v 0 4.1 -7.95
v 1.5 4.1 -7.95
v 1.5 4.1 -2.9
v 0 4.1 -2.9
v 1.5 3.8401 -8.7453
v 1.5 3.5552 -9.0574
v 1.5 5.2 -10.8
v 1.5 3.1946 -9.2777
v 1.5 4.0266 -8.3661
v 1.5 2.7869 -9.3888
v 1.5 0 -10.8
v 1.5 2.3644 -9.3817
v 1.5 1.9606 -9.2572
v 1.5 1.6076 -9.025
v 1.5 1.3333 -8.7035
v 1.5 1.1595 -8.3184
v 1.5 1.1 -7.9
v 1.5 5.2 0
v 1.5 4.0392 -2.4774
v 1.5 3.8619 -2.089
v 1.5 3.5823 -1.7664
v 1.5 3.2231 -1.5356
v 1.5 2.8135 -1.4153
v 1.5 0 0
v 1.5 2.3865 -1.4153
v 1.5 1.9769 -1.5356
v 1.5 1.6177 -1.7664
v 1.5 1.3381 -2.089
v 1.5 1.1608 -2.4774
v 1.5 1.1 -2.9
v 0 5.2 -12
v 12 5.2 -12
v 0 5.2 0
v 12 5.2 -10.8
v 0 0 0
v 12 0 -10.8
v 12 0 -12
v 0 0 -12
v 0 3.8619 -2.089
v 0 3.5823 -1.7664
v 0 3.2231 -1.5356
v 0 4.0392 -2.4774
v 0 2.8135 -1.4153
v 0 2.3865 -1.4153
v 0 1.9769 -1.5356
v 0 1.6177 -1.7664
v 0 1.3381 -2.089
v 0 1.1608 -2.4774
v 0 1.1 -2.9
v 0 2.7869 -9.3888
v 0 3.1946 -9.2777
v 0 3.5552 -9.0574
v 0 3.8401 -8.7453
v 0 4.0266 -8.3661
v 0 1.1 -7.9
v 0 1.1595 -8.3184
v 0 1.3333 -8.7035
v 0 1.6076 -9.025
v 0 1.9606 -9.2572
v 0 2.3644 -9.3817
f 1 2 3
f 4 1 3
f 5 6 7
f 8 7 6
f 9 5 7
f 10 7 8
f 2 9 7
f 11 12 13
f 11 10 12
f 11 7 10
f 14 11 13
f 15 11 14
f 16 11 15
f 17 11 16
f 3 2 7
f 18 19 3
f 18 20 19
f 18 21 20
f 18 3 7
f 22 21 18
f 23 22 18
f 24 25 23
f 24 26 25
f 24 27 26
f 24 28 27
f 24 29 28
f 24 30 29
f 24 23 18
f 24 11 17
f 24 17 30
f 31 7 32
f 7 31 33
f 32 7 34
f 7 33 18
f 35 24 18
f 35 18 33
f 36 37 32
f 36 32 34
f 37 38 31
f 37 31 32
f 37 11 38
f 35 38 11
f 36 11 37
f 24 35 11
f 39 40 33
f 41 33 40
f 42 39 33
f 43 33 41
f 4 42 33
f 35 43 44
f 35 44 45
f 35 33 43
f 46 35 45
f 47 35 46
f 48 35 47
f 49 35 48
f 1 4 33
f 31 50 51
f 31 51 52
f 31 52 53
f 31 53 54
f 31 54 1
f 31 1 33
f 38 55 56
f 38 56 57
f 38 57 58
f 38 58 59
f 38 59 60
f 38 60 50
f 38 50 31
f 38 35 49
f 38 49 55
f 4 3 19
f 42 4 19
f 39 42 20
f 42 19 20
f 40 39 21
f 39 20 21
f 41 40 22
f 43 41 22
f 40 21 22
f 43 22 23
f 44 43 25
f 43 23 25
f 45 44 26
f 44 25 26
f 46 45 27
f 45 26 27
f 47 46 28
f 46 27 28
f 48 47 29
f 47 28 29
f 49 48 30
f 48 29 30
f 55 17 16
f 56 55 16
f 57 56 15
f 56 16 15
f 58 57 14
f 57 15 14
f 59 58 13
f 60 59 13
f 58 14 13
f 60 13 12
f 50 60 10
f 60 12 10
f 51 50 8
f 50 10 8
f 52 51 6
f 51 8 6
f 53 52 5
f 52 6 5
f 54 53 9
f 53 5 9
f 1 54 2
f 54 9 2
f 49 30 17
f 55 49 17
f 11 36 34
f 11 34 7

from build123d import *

# Parameters (mm, degrees)
F1_DEPTH = 5.2
F3_DEPTH = 25.4


with BuildPart() as f1:
    # F0 (on Front) → F1 (new body)
    with BuildSketch(Plane.XZ):
        Polygon((1.5, 0), (0, 0), (0, -12), (12, -12), (12, -10.8), (1.5, -10.8), align=None)
    extrude(amount=-F1_DEPTH)

    # F2 (on face) → F3 (cut)
    with BuildSketch(Plane.YZ.offset(1.5)):
        with BuildLine():
            Line((1.1, -2.9), (1.1, -7.9))
            ThreePointArc((1.1, -7.9), (2.575413, -9.400208), (4.1, -7.95))
            Line((4.1, -7.95), (4.1, -2.9))
            ThreePointArc((4.1, -2.9), (2.6, -1.4), (1.1, -2.9))
        make_face()
    extrude(amount=-F3_DEPTH, mode=Mode.SUBTRACT)


solid = f1.part
